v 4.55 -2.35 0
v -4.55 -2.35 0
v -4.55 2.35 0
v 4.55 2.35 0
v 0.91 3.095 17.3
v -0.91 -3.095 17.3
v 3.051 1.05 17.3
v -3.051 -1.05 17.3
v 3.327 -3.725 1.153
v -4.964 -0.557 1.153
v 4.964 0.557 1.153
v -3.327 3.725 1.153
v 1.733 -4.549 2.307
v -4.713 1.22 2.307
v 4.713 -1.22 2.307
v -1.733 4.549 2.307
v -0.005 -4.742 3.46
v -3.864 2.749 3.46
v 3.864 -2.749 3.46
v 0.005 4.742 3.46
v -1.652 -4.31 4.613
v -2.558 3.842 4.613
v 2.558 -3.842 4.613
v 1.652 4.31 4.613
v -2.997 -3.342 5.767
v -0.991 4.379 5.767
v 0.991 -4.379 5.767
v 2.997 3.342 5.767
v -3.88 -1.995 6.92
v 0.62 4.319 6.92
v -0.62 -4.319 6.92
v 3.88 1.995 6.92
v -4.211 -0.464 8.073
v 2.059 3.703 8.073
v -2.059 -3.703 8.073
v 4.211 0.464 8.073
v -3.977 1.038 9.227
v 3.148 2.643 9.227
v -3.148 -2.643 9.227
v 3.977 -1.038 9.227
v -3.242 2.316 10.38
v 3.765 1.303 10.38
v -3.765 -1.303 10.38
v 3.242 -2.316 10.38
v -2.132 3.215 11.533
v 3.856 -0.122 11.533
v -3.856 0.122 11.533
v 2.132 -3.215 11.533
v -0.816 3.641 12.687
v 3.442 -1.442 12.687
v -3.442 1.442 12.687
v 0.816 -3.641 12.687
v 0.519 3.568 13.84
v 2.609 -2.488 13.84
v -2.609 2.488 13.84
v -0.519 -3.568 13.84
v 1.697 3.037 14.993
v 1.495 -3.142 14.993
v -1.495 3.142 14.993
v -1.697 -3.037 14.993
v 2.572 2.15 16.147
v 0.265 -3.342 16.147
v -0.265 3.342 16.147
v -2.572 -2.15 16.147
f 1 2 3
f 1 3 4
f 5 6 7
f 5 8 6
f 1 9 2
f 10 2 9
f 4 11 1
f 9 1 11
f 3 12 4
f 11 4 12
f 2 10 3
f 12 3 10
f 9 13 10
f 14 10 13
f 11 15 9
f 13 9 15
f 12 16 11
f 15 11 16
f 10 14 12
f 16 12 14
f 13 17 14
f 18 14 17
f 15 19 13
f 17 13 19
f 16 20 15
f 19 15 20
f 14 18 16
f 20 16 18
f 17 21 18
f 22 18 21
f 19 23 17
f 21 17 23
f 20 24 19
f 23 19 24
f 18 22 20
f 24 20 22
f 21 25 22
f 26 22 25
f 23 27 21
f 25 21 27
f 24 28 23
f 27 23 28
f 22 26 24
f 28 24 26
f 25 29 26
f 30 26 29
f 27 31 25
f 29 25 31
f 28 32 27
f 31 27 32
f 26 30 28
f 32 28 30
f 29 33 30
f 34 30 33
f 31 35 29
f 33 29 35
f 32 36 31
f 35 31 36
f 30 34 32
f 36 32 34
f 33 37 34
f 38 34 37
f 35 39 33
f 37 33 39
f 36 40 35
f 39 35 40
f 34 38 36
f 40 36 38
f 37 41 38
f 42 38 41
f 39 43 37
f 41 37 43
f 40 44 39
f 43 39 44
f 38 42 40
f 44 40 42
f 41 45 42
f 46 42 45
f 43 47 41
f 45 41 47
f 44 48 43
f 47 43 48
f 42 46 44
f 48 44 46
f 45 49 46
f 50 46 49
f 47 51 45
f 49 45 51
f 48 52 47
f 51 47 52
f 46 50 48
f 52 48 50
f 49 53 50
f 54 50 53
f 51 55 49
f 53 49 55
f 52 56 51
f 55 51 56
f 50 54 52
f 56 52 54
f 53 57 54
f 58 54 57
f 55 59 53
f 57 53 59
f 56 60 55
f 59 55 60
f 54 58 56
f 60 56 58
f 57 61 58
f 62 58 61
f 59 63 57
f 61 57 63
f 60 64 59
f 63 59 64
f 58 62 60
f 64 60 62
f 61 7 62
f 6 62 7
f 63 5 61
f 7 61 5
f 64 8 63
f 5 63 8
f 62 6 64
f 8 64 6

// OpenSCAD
// exercises getHelixSlices()
linear_extrude(height = 17.3, twist = 313.7, scale = 0.63) square([9.1, 4.7], center = true);
